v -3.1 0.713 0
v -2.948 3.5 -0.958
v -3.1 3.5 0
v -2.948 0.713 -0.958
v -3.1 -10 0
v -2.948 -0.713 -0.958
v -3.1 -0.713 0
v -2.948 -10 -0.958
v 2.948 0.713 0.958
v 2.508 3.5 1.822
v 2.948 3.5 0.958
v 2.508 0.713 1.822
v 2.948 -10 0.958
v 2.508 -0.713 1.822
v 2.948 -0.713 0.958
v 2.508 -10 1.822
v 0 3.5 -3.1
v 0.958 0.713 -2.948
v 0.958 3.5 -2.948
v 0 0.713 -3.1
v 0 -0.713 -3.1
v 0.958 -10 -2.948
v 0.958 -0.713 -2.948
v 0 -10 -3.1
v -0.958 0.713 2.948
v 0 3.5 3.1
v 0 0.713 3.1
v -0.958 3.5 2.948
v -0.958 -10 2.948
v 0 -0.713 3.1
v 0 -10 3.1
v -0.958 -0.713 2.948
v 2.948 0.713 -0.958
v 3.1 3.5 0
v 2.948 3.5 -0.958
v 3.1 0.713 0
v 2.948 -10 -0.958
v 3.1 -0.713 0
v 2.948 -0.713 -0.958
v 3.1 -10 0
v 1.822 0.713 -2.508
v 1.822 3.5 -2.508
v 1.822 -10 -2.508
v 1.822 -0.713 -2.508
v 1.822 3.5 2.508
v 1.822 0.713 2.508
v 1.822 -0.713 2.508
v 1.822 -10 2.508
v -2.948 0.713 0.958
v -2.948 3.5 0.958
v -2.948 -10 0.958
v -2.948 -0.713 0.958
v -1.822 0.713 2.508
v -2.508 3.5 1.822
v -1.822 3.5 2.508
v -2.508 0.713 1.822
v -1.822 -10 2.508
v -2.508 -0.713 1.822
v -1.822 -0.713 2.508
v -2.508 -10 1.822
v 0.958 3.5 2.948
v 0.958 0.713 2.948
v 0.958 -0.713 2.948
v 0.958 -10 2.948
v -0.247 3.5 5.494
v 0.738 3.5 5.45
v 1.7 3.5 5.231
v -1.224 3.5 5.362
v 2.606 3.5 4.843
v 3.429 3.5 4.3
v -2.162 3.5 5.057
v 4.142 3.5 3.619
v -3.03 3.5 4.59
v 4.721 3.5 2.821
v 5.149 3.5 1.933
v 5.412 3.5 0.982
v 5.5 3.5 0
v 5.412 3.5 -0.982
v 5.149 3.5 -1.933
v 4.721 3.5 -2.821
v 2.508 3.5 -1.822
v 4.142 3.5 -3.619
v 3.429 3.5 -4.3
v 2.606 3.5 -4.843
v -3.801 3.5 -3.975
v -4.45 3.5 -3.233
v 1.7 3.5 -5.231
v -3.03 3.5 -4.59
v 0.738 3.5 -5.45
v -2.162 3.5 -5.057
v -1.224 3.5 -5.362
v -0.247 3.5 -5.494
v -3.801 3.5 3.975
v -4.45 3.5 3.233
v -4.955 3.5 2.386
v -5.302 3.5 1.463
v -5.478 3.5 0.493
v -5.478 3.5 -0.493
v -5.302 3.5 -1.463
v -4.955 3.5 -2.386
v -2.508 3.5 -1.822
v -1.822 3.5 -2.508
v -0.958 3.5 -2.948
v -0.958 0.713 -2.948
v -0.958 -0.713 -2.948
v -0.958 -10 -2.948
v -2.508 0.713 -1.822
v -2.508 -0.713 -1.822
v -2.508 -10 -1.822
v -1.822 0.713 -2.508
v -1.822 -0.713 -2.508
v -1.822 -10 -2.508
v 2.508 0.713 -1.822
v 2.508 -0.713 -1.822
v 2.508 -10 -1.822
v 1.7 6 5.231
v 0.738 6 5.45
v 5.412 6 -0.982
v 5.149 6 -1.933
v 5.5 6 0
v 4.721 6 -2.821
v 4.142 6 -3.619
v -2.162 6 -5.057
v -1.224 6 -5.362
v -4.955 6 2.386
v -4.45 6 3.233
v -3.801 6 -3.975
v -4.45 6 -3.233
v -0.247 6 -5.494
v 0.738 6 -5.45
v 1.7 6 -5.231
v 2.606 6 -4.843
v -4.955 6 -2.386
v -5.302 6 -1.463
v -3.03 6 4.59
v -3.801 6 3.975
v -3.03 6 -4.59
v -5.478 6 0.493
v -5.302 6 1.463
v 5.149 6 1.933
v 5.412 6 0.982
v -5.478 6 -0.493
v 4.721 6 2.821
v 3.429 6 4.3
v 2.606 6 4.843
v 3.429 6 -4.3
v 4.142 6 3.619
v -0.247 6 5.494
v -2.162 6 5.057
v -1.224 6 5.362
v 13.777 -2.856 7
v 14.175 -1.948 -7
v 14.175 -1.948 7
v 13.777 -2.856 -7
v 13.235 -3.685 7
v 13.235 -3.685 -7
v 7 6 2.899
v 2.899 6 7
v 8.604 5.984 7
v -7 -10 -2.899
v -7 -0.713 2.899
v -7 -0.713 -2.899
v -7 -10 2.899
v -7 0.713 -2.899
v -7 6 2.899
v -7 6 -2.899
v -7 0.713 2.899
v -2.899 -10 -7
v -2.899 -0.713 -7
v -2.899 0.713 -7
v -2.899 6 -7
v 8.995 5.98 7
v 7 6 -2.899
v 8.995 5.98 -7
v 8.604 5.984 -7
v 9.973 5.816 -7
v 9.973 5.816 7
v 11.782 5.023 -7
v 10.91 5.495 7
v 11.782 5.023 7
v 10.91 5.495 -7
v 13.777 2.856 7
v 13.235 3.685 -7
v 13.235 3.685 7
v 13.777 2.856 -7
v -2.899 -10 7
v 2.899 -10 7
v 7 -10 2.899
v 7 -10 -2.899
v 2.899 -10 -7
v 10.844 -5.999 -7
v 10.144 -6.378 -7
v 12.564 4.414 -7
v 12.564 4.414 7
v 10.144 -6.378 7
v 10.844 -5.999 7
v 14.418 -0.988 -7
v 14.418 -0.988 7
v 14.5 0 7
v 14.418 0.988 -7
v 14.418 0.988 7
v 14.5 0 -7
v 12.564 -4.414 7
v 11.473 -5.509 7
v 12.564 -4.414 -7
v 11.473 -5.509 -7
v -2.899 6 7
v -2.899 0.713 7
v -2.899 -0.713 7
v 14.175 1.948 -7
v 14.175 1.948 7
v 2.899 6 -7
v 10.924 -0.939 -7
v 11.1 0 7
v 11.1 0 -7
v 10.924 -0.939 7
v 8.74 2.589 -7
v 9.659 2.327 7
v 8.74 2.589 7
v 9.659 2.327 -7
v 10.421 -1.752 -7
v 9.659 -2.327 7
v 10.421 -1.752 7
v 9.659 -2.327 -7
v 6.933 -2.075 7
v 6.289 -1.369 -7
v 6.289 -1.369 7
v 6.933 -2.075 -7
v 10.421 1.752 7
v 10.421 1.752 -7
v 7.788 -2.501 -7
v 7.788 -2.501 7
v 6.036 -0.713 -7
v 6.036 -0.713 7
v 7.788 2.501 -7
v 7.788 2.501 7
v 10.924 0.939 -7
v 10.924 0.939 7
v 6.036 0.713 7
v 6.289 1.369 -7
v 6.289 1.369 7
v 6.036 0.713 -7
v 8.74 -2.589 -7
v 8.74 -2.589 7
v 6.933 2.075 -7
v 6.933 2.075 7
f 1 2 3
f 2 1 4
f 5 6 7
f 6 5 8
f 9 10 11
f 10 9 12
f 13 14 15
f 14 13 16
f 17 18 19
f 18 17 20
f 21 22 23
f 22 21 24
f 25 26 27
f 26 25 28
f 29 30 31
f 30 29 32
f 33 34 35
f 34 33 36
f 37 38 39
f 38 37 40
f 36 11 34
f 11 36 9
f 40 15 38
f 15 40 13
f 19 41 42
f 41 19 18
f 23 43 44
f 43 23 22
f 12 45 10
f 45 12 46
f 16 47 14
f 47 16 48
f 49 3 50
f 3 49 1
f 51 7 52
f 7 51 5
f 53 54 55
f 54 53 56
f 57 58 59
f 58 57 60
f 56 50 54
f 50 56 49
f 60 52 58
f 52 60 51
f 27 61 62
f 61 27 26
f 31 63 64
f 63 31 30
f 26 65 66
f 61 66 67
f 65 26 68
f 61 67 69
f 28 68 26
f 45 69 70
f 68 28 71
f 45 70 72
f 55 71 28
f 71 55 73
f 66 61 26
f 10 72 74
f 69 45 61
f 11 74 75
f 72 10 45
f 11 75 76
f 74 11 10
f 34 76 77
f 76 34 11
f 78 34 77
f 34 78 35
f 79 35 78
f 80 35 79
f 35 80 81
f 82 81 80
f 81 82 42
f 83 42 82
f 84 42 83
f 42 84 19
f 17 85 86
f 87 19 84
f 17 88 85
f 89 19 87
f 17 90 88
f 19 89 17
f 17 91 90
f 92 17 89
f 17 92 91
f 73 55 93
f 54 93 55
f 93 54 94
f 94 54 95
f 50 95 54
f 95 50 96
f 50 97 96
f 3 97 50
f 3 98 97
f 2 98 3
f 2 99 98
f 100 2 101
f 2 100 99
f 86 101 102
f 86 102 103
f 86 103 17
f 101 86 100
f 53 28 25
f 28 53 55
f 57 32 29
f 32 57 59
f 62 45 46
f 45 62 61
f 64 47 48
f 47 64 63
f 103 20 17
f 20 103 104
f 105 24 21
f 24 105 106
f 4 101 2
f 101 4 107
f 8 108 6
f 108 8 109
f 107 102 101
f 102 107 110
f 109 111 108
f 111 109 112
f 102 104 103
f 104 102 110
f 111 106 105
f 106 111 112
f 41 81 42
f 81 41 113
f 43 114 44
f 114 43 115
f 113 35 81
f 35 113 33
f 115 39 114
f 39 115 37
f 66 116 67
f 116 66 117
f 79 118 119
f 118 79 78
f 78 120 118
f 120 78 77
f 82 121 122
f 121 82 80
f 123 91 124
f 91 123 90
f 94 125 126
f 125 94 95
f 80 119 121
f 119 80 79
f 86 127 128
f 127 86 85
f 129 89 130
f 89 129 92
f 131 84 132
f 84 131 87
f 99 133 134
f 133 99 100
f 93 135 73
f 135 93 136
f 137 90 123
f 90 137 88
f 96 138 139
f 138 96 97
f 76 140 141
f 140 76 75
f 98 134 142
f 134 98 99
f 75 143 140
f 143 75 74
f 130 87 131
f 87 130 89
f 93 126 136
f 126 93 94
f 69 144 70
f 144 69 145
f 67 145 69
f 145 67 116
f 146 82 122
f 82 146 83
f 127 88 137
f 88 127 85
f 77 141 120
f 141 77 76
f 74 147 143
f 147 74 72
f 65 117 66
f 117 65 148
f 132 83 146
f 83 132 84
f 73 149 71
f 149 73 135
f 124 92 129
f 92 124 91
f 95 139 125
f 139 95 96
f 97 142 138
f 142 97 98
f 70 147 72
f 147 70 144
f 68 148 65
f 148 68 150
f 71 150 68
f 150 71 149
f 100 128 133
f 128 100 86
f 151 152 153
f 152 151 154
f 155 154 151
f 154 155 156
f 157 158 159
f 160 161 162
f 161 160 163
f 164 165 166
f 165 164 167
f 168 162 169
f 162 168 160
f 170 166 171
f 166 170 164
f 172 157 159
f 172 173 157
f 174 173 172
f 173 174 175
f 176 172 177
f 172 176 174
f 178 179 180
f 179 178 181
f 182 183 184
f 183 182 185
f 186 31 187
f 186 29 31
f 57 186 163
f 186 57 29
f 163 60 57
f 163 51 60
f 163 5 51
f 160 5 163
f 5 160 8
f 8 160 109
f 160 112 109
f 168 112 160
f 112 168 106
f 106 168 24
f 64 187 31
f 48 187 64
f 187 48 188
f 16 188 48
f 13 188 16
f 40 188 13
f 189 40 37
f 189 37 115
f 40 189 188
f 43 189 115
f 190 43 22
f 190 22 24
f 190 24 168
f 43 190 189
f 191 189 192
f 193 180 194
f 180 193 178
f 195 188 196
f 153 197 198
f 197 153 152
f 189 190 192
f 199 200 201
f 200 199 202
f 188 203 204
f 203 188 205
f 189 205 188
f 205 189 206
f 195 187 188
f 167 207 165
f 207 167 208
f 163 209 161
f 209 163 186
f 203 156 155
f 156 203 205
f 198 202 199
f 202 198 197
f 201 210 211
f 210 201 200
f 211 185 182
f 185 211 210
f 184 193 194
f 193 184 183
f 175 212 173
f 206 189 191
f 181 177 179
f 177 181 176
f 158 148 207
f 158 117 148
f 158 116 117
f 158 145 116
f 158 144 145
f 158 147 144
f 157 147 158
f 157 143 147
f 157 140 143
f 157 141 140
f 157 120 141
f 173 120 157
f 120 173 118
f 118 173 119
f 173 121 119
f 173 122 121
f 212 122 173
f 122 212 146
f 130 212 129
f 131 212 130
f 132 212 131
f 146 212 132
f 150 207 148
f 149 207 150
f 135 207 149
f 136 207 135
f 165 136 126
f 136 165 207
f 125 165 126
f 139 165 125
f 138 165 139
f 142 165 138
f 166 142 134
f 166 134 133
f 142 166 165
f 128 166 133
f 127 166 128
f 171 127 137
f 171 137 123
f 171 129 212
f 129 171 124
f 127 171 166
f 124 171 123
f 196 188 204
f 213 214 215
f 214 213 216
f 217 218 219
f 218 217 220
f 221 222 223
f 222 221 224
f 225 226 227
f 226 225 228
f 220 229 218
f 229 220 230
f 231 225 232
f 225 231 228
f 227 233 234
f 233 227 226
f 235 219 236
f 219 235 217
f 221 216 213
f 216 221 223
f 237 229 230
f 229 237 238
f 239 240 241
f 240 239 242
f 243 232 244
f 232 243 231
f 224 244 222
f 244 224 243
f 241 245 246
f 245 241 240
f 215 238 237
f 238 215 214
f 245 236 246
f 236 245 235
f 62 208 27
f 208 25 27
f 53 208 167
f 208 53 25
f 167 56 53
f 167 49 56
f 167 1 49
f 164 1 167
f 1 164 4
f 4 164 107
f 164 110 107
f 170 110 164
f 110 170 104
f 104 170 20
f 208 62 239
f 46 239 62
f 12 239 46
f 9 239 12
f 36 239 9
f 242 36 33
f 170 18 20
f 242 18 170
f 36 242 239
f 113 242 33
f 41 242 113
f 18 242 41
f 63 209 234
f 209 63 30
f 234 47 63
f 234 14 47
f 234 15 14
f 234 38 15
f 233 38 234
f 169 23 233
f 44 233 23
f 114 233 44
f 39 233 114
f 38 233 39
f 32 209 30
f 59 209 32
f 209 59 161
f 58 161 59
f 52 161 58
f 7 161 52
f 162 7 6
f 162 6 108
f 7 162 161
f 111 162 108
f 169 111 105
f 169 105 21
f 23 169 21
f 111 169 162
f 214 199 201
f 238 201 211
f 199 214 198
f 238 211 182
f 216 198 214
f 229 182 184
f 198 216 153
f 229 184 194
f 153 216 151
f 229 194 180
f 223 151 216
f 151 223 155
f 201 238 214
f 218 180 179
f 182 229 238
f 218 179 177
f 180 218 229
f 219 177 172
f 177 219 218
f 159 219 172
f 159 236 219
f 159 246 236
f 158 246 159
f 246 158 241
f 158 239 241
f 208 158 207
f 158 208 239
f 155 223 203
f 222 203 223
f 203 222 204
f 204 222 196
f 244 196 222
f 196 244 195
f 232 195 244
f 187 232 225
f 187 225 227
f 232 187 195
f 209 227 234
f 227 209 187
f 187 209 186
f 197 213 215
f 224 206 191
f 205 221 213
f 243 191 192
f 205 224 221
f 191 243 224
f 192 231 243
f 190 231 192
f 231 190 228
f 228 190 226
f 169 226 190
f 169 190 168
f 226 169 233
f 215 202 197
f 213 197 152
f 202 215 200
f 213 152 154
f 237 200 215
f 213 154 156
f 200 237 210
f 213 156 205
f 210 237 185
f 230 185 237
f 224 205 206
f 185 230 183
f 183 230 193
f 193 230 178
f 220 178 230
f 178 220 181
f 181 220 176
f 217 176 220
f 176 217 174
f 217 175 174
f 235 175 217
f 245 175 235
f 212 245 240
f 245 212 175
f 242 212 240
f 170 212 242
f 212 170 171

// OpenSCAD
// -1 is left side
direction = -1; // 1, 0, or -1
/*stayAngle = direction * asin(55/(13*25.4)); // rear*/
stayAngle = direction * asin(30/(13*25.4)); // rear
stayAngle = 0; // front

thick = 1.5;
stayD = 5.2;
boltD = 6.2;
boltHeadD = 11;
tall = 12;
post = 4;

$fs = 1;
$fa = 6;

module bolt() {
    cylinder(d=boltD, h=20, center=false);
    rotate([180,0,0]) cylinder(d=boltHeadD, h=10, center=false);
}

module hex(d, h, center) {
     cylinder(d=d/cos(180/8), $fn=8, h=h, center=center);
}
outerD = boltHeadD + 2*thick;
offset = tan(stayAngle) * outerD;
smoffset = sin(stayAngle) * outerD;
echo(str("Variable = ", smoffset, offset));
intersection() {
    rotate([90,0,0]) difference() {
        hull() {
            translate([0,0, post/2]) rotate([0,0,22.5]) hex(d=outerD, h=tall + post, center=true);
            translate([outerD/2 + thick,0,smoffset/2]) rotate([90 - stayAngle,0,0]) cylinder(d=tall, h=boltHeadD + 2*thick + 2, center=true);
        }
        rotate([direction == 1 ? 180 : 0,0,0]) translate([0,0,-(thick+2)]) bolt();
        translate([outerD/2 + thick,0,smoffset/2]) rotate([90 - stayAngle,0,0]) cylinder(d=stayD, h=100, center=true);
        hull() {
            translate([outerD/2,0,smoffset/2]) rotate([90 - stayAngle,0,0]) cylinder(d=1.5, h=outerD+4, center=true);
            rotate([90,0,0]) cylinder(d=1.5, h=outerD+1, center=true);
        }
        hull() {
            rotate([90,0,0]) cylinder(d=1.5, h=outerD+4, center=true);
            translate([-outerD,0,0]) rotate([90,0,0]) cylinder(d=1.5, h=outerD+1, center=true);
        }
    }
    cube([100, 100, outerD], center=true);
}
